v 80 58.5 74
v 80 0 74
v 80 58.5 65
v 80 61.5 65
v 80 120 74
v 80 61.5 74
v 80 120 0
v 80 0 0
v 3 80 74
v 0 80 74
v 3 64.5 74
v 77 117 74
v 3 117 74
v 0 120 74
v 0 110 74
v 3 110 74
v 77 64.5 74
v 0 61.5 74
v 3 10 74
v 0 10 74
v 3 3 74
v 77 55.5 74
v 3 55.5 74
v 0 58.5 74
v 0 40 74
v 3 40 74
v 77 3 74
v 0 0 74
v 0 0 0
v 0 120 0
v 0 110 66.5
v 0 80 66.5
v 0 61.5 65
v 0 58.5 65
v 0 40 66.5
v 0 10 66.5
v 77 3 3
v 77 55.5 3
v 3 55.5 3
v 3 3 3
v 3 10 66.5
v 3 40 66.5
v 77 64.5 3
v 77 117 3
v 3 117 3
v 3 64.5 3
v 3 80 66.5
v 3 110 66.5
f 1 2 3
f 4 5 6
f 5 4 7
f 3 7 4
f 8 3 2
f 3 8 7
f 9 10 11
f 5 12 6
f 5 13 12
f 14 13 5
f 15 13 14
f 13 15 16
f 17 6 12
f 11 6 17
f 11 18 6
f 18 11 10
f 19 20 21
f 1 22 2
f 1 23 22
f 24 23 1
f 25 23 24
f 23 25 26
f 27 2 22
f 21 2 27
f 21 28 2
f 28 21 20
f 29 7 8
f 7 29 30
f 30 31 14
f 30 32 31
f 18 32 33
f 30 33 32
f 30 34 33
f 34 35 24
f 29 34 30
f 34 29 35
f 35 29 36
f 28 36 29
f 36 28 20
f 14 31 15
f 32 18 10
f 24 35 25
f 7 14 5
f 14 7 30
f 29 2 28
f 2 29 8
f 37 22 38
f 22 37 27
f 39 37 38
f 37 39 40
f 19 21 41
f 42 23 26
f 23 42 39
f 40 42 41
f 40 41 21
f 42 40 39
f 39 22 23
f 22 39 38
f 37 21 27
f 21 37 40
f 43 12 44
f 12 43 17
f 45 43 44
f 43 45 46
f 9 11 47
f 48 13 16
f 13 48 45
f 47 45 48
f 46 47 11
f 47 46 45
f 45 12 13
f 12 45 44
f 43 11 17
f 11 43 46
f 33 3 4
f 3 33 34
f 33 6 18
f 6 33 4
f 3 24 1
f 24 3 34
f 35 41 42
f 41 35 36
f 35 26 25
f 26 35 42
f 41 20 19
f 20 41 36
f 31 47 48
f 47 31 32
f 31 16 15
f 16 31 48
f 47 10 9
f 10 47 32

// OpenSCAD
space=6;
mcx = 80;
mcy = 60;
mcz = 9+65;
thick = 3;
imcx = mcx-2*thick;
imcy = mcy-(2*thick);
imcz = mcz-2*thick;
fr=15;
ifr=13;
hf=2;

difference(){
translate([0,0,0])
    color("blue")
    cube([mcx,mcy*2,mcz]);
translate([3,3,3])
    cube([imcx,imcy-1.5,mcz+5]);
translate([3,3+mcy+1.5,3])
   cube([imcx,imcy-1.5,mcz+5]);
translate([-1,3+mcy-4.5,mcz-9])
 cube([mcx+5,3,mcz+5]);
translate([-1,10,mcz-7.5])
   cube([5,30,10]);
translate([-1,mcy*2-10-30,mcz-7.5])
   cube([5,30,10]);
    

}
rotate([90,0,0])
text("Corchea");
